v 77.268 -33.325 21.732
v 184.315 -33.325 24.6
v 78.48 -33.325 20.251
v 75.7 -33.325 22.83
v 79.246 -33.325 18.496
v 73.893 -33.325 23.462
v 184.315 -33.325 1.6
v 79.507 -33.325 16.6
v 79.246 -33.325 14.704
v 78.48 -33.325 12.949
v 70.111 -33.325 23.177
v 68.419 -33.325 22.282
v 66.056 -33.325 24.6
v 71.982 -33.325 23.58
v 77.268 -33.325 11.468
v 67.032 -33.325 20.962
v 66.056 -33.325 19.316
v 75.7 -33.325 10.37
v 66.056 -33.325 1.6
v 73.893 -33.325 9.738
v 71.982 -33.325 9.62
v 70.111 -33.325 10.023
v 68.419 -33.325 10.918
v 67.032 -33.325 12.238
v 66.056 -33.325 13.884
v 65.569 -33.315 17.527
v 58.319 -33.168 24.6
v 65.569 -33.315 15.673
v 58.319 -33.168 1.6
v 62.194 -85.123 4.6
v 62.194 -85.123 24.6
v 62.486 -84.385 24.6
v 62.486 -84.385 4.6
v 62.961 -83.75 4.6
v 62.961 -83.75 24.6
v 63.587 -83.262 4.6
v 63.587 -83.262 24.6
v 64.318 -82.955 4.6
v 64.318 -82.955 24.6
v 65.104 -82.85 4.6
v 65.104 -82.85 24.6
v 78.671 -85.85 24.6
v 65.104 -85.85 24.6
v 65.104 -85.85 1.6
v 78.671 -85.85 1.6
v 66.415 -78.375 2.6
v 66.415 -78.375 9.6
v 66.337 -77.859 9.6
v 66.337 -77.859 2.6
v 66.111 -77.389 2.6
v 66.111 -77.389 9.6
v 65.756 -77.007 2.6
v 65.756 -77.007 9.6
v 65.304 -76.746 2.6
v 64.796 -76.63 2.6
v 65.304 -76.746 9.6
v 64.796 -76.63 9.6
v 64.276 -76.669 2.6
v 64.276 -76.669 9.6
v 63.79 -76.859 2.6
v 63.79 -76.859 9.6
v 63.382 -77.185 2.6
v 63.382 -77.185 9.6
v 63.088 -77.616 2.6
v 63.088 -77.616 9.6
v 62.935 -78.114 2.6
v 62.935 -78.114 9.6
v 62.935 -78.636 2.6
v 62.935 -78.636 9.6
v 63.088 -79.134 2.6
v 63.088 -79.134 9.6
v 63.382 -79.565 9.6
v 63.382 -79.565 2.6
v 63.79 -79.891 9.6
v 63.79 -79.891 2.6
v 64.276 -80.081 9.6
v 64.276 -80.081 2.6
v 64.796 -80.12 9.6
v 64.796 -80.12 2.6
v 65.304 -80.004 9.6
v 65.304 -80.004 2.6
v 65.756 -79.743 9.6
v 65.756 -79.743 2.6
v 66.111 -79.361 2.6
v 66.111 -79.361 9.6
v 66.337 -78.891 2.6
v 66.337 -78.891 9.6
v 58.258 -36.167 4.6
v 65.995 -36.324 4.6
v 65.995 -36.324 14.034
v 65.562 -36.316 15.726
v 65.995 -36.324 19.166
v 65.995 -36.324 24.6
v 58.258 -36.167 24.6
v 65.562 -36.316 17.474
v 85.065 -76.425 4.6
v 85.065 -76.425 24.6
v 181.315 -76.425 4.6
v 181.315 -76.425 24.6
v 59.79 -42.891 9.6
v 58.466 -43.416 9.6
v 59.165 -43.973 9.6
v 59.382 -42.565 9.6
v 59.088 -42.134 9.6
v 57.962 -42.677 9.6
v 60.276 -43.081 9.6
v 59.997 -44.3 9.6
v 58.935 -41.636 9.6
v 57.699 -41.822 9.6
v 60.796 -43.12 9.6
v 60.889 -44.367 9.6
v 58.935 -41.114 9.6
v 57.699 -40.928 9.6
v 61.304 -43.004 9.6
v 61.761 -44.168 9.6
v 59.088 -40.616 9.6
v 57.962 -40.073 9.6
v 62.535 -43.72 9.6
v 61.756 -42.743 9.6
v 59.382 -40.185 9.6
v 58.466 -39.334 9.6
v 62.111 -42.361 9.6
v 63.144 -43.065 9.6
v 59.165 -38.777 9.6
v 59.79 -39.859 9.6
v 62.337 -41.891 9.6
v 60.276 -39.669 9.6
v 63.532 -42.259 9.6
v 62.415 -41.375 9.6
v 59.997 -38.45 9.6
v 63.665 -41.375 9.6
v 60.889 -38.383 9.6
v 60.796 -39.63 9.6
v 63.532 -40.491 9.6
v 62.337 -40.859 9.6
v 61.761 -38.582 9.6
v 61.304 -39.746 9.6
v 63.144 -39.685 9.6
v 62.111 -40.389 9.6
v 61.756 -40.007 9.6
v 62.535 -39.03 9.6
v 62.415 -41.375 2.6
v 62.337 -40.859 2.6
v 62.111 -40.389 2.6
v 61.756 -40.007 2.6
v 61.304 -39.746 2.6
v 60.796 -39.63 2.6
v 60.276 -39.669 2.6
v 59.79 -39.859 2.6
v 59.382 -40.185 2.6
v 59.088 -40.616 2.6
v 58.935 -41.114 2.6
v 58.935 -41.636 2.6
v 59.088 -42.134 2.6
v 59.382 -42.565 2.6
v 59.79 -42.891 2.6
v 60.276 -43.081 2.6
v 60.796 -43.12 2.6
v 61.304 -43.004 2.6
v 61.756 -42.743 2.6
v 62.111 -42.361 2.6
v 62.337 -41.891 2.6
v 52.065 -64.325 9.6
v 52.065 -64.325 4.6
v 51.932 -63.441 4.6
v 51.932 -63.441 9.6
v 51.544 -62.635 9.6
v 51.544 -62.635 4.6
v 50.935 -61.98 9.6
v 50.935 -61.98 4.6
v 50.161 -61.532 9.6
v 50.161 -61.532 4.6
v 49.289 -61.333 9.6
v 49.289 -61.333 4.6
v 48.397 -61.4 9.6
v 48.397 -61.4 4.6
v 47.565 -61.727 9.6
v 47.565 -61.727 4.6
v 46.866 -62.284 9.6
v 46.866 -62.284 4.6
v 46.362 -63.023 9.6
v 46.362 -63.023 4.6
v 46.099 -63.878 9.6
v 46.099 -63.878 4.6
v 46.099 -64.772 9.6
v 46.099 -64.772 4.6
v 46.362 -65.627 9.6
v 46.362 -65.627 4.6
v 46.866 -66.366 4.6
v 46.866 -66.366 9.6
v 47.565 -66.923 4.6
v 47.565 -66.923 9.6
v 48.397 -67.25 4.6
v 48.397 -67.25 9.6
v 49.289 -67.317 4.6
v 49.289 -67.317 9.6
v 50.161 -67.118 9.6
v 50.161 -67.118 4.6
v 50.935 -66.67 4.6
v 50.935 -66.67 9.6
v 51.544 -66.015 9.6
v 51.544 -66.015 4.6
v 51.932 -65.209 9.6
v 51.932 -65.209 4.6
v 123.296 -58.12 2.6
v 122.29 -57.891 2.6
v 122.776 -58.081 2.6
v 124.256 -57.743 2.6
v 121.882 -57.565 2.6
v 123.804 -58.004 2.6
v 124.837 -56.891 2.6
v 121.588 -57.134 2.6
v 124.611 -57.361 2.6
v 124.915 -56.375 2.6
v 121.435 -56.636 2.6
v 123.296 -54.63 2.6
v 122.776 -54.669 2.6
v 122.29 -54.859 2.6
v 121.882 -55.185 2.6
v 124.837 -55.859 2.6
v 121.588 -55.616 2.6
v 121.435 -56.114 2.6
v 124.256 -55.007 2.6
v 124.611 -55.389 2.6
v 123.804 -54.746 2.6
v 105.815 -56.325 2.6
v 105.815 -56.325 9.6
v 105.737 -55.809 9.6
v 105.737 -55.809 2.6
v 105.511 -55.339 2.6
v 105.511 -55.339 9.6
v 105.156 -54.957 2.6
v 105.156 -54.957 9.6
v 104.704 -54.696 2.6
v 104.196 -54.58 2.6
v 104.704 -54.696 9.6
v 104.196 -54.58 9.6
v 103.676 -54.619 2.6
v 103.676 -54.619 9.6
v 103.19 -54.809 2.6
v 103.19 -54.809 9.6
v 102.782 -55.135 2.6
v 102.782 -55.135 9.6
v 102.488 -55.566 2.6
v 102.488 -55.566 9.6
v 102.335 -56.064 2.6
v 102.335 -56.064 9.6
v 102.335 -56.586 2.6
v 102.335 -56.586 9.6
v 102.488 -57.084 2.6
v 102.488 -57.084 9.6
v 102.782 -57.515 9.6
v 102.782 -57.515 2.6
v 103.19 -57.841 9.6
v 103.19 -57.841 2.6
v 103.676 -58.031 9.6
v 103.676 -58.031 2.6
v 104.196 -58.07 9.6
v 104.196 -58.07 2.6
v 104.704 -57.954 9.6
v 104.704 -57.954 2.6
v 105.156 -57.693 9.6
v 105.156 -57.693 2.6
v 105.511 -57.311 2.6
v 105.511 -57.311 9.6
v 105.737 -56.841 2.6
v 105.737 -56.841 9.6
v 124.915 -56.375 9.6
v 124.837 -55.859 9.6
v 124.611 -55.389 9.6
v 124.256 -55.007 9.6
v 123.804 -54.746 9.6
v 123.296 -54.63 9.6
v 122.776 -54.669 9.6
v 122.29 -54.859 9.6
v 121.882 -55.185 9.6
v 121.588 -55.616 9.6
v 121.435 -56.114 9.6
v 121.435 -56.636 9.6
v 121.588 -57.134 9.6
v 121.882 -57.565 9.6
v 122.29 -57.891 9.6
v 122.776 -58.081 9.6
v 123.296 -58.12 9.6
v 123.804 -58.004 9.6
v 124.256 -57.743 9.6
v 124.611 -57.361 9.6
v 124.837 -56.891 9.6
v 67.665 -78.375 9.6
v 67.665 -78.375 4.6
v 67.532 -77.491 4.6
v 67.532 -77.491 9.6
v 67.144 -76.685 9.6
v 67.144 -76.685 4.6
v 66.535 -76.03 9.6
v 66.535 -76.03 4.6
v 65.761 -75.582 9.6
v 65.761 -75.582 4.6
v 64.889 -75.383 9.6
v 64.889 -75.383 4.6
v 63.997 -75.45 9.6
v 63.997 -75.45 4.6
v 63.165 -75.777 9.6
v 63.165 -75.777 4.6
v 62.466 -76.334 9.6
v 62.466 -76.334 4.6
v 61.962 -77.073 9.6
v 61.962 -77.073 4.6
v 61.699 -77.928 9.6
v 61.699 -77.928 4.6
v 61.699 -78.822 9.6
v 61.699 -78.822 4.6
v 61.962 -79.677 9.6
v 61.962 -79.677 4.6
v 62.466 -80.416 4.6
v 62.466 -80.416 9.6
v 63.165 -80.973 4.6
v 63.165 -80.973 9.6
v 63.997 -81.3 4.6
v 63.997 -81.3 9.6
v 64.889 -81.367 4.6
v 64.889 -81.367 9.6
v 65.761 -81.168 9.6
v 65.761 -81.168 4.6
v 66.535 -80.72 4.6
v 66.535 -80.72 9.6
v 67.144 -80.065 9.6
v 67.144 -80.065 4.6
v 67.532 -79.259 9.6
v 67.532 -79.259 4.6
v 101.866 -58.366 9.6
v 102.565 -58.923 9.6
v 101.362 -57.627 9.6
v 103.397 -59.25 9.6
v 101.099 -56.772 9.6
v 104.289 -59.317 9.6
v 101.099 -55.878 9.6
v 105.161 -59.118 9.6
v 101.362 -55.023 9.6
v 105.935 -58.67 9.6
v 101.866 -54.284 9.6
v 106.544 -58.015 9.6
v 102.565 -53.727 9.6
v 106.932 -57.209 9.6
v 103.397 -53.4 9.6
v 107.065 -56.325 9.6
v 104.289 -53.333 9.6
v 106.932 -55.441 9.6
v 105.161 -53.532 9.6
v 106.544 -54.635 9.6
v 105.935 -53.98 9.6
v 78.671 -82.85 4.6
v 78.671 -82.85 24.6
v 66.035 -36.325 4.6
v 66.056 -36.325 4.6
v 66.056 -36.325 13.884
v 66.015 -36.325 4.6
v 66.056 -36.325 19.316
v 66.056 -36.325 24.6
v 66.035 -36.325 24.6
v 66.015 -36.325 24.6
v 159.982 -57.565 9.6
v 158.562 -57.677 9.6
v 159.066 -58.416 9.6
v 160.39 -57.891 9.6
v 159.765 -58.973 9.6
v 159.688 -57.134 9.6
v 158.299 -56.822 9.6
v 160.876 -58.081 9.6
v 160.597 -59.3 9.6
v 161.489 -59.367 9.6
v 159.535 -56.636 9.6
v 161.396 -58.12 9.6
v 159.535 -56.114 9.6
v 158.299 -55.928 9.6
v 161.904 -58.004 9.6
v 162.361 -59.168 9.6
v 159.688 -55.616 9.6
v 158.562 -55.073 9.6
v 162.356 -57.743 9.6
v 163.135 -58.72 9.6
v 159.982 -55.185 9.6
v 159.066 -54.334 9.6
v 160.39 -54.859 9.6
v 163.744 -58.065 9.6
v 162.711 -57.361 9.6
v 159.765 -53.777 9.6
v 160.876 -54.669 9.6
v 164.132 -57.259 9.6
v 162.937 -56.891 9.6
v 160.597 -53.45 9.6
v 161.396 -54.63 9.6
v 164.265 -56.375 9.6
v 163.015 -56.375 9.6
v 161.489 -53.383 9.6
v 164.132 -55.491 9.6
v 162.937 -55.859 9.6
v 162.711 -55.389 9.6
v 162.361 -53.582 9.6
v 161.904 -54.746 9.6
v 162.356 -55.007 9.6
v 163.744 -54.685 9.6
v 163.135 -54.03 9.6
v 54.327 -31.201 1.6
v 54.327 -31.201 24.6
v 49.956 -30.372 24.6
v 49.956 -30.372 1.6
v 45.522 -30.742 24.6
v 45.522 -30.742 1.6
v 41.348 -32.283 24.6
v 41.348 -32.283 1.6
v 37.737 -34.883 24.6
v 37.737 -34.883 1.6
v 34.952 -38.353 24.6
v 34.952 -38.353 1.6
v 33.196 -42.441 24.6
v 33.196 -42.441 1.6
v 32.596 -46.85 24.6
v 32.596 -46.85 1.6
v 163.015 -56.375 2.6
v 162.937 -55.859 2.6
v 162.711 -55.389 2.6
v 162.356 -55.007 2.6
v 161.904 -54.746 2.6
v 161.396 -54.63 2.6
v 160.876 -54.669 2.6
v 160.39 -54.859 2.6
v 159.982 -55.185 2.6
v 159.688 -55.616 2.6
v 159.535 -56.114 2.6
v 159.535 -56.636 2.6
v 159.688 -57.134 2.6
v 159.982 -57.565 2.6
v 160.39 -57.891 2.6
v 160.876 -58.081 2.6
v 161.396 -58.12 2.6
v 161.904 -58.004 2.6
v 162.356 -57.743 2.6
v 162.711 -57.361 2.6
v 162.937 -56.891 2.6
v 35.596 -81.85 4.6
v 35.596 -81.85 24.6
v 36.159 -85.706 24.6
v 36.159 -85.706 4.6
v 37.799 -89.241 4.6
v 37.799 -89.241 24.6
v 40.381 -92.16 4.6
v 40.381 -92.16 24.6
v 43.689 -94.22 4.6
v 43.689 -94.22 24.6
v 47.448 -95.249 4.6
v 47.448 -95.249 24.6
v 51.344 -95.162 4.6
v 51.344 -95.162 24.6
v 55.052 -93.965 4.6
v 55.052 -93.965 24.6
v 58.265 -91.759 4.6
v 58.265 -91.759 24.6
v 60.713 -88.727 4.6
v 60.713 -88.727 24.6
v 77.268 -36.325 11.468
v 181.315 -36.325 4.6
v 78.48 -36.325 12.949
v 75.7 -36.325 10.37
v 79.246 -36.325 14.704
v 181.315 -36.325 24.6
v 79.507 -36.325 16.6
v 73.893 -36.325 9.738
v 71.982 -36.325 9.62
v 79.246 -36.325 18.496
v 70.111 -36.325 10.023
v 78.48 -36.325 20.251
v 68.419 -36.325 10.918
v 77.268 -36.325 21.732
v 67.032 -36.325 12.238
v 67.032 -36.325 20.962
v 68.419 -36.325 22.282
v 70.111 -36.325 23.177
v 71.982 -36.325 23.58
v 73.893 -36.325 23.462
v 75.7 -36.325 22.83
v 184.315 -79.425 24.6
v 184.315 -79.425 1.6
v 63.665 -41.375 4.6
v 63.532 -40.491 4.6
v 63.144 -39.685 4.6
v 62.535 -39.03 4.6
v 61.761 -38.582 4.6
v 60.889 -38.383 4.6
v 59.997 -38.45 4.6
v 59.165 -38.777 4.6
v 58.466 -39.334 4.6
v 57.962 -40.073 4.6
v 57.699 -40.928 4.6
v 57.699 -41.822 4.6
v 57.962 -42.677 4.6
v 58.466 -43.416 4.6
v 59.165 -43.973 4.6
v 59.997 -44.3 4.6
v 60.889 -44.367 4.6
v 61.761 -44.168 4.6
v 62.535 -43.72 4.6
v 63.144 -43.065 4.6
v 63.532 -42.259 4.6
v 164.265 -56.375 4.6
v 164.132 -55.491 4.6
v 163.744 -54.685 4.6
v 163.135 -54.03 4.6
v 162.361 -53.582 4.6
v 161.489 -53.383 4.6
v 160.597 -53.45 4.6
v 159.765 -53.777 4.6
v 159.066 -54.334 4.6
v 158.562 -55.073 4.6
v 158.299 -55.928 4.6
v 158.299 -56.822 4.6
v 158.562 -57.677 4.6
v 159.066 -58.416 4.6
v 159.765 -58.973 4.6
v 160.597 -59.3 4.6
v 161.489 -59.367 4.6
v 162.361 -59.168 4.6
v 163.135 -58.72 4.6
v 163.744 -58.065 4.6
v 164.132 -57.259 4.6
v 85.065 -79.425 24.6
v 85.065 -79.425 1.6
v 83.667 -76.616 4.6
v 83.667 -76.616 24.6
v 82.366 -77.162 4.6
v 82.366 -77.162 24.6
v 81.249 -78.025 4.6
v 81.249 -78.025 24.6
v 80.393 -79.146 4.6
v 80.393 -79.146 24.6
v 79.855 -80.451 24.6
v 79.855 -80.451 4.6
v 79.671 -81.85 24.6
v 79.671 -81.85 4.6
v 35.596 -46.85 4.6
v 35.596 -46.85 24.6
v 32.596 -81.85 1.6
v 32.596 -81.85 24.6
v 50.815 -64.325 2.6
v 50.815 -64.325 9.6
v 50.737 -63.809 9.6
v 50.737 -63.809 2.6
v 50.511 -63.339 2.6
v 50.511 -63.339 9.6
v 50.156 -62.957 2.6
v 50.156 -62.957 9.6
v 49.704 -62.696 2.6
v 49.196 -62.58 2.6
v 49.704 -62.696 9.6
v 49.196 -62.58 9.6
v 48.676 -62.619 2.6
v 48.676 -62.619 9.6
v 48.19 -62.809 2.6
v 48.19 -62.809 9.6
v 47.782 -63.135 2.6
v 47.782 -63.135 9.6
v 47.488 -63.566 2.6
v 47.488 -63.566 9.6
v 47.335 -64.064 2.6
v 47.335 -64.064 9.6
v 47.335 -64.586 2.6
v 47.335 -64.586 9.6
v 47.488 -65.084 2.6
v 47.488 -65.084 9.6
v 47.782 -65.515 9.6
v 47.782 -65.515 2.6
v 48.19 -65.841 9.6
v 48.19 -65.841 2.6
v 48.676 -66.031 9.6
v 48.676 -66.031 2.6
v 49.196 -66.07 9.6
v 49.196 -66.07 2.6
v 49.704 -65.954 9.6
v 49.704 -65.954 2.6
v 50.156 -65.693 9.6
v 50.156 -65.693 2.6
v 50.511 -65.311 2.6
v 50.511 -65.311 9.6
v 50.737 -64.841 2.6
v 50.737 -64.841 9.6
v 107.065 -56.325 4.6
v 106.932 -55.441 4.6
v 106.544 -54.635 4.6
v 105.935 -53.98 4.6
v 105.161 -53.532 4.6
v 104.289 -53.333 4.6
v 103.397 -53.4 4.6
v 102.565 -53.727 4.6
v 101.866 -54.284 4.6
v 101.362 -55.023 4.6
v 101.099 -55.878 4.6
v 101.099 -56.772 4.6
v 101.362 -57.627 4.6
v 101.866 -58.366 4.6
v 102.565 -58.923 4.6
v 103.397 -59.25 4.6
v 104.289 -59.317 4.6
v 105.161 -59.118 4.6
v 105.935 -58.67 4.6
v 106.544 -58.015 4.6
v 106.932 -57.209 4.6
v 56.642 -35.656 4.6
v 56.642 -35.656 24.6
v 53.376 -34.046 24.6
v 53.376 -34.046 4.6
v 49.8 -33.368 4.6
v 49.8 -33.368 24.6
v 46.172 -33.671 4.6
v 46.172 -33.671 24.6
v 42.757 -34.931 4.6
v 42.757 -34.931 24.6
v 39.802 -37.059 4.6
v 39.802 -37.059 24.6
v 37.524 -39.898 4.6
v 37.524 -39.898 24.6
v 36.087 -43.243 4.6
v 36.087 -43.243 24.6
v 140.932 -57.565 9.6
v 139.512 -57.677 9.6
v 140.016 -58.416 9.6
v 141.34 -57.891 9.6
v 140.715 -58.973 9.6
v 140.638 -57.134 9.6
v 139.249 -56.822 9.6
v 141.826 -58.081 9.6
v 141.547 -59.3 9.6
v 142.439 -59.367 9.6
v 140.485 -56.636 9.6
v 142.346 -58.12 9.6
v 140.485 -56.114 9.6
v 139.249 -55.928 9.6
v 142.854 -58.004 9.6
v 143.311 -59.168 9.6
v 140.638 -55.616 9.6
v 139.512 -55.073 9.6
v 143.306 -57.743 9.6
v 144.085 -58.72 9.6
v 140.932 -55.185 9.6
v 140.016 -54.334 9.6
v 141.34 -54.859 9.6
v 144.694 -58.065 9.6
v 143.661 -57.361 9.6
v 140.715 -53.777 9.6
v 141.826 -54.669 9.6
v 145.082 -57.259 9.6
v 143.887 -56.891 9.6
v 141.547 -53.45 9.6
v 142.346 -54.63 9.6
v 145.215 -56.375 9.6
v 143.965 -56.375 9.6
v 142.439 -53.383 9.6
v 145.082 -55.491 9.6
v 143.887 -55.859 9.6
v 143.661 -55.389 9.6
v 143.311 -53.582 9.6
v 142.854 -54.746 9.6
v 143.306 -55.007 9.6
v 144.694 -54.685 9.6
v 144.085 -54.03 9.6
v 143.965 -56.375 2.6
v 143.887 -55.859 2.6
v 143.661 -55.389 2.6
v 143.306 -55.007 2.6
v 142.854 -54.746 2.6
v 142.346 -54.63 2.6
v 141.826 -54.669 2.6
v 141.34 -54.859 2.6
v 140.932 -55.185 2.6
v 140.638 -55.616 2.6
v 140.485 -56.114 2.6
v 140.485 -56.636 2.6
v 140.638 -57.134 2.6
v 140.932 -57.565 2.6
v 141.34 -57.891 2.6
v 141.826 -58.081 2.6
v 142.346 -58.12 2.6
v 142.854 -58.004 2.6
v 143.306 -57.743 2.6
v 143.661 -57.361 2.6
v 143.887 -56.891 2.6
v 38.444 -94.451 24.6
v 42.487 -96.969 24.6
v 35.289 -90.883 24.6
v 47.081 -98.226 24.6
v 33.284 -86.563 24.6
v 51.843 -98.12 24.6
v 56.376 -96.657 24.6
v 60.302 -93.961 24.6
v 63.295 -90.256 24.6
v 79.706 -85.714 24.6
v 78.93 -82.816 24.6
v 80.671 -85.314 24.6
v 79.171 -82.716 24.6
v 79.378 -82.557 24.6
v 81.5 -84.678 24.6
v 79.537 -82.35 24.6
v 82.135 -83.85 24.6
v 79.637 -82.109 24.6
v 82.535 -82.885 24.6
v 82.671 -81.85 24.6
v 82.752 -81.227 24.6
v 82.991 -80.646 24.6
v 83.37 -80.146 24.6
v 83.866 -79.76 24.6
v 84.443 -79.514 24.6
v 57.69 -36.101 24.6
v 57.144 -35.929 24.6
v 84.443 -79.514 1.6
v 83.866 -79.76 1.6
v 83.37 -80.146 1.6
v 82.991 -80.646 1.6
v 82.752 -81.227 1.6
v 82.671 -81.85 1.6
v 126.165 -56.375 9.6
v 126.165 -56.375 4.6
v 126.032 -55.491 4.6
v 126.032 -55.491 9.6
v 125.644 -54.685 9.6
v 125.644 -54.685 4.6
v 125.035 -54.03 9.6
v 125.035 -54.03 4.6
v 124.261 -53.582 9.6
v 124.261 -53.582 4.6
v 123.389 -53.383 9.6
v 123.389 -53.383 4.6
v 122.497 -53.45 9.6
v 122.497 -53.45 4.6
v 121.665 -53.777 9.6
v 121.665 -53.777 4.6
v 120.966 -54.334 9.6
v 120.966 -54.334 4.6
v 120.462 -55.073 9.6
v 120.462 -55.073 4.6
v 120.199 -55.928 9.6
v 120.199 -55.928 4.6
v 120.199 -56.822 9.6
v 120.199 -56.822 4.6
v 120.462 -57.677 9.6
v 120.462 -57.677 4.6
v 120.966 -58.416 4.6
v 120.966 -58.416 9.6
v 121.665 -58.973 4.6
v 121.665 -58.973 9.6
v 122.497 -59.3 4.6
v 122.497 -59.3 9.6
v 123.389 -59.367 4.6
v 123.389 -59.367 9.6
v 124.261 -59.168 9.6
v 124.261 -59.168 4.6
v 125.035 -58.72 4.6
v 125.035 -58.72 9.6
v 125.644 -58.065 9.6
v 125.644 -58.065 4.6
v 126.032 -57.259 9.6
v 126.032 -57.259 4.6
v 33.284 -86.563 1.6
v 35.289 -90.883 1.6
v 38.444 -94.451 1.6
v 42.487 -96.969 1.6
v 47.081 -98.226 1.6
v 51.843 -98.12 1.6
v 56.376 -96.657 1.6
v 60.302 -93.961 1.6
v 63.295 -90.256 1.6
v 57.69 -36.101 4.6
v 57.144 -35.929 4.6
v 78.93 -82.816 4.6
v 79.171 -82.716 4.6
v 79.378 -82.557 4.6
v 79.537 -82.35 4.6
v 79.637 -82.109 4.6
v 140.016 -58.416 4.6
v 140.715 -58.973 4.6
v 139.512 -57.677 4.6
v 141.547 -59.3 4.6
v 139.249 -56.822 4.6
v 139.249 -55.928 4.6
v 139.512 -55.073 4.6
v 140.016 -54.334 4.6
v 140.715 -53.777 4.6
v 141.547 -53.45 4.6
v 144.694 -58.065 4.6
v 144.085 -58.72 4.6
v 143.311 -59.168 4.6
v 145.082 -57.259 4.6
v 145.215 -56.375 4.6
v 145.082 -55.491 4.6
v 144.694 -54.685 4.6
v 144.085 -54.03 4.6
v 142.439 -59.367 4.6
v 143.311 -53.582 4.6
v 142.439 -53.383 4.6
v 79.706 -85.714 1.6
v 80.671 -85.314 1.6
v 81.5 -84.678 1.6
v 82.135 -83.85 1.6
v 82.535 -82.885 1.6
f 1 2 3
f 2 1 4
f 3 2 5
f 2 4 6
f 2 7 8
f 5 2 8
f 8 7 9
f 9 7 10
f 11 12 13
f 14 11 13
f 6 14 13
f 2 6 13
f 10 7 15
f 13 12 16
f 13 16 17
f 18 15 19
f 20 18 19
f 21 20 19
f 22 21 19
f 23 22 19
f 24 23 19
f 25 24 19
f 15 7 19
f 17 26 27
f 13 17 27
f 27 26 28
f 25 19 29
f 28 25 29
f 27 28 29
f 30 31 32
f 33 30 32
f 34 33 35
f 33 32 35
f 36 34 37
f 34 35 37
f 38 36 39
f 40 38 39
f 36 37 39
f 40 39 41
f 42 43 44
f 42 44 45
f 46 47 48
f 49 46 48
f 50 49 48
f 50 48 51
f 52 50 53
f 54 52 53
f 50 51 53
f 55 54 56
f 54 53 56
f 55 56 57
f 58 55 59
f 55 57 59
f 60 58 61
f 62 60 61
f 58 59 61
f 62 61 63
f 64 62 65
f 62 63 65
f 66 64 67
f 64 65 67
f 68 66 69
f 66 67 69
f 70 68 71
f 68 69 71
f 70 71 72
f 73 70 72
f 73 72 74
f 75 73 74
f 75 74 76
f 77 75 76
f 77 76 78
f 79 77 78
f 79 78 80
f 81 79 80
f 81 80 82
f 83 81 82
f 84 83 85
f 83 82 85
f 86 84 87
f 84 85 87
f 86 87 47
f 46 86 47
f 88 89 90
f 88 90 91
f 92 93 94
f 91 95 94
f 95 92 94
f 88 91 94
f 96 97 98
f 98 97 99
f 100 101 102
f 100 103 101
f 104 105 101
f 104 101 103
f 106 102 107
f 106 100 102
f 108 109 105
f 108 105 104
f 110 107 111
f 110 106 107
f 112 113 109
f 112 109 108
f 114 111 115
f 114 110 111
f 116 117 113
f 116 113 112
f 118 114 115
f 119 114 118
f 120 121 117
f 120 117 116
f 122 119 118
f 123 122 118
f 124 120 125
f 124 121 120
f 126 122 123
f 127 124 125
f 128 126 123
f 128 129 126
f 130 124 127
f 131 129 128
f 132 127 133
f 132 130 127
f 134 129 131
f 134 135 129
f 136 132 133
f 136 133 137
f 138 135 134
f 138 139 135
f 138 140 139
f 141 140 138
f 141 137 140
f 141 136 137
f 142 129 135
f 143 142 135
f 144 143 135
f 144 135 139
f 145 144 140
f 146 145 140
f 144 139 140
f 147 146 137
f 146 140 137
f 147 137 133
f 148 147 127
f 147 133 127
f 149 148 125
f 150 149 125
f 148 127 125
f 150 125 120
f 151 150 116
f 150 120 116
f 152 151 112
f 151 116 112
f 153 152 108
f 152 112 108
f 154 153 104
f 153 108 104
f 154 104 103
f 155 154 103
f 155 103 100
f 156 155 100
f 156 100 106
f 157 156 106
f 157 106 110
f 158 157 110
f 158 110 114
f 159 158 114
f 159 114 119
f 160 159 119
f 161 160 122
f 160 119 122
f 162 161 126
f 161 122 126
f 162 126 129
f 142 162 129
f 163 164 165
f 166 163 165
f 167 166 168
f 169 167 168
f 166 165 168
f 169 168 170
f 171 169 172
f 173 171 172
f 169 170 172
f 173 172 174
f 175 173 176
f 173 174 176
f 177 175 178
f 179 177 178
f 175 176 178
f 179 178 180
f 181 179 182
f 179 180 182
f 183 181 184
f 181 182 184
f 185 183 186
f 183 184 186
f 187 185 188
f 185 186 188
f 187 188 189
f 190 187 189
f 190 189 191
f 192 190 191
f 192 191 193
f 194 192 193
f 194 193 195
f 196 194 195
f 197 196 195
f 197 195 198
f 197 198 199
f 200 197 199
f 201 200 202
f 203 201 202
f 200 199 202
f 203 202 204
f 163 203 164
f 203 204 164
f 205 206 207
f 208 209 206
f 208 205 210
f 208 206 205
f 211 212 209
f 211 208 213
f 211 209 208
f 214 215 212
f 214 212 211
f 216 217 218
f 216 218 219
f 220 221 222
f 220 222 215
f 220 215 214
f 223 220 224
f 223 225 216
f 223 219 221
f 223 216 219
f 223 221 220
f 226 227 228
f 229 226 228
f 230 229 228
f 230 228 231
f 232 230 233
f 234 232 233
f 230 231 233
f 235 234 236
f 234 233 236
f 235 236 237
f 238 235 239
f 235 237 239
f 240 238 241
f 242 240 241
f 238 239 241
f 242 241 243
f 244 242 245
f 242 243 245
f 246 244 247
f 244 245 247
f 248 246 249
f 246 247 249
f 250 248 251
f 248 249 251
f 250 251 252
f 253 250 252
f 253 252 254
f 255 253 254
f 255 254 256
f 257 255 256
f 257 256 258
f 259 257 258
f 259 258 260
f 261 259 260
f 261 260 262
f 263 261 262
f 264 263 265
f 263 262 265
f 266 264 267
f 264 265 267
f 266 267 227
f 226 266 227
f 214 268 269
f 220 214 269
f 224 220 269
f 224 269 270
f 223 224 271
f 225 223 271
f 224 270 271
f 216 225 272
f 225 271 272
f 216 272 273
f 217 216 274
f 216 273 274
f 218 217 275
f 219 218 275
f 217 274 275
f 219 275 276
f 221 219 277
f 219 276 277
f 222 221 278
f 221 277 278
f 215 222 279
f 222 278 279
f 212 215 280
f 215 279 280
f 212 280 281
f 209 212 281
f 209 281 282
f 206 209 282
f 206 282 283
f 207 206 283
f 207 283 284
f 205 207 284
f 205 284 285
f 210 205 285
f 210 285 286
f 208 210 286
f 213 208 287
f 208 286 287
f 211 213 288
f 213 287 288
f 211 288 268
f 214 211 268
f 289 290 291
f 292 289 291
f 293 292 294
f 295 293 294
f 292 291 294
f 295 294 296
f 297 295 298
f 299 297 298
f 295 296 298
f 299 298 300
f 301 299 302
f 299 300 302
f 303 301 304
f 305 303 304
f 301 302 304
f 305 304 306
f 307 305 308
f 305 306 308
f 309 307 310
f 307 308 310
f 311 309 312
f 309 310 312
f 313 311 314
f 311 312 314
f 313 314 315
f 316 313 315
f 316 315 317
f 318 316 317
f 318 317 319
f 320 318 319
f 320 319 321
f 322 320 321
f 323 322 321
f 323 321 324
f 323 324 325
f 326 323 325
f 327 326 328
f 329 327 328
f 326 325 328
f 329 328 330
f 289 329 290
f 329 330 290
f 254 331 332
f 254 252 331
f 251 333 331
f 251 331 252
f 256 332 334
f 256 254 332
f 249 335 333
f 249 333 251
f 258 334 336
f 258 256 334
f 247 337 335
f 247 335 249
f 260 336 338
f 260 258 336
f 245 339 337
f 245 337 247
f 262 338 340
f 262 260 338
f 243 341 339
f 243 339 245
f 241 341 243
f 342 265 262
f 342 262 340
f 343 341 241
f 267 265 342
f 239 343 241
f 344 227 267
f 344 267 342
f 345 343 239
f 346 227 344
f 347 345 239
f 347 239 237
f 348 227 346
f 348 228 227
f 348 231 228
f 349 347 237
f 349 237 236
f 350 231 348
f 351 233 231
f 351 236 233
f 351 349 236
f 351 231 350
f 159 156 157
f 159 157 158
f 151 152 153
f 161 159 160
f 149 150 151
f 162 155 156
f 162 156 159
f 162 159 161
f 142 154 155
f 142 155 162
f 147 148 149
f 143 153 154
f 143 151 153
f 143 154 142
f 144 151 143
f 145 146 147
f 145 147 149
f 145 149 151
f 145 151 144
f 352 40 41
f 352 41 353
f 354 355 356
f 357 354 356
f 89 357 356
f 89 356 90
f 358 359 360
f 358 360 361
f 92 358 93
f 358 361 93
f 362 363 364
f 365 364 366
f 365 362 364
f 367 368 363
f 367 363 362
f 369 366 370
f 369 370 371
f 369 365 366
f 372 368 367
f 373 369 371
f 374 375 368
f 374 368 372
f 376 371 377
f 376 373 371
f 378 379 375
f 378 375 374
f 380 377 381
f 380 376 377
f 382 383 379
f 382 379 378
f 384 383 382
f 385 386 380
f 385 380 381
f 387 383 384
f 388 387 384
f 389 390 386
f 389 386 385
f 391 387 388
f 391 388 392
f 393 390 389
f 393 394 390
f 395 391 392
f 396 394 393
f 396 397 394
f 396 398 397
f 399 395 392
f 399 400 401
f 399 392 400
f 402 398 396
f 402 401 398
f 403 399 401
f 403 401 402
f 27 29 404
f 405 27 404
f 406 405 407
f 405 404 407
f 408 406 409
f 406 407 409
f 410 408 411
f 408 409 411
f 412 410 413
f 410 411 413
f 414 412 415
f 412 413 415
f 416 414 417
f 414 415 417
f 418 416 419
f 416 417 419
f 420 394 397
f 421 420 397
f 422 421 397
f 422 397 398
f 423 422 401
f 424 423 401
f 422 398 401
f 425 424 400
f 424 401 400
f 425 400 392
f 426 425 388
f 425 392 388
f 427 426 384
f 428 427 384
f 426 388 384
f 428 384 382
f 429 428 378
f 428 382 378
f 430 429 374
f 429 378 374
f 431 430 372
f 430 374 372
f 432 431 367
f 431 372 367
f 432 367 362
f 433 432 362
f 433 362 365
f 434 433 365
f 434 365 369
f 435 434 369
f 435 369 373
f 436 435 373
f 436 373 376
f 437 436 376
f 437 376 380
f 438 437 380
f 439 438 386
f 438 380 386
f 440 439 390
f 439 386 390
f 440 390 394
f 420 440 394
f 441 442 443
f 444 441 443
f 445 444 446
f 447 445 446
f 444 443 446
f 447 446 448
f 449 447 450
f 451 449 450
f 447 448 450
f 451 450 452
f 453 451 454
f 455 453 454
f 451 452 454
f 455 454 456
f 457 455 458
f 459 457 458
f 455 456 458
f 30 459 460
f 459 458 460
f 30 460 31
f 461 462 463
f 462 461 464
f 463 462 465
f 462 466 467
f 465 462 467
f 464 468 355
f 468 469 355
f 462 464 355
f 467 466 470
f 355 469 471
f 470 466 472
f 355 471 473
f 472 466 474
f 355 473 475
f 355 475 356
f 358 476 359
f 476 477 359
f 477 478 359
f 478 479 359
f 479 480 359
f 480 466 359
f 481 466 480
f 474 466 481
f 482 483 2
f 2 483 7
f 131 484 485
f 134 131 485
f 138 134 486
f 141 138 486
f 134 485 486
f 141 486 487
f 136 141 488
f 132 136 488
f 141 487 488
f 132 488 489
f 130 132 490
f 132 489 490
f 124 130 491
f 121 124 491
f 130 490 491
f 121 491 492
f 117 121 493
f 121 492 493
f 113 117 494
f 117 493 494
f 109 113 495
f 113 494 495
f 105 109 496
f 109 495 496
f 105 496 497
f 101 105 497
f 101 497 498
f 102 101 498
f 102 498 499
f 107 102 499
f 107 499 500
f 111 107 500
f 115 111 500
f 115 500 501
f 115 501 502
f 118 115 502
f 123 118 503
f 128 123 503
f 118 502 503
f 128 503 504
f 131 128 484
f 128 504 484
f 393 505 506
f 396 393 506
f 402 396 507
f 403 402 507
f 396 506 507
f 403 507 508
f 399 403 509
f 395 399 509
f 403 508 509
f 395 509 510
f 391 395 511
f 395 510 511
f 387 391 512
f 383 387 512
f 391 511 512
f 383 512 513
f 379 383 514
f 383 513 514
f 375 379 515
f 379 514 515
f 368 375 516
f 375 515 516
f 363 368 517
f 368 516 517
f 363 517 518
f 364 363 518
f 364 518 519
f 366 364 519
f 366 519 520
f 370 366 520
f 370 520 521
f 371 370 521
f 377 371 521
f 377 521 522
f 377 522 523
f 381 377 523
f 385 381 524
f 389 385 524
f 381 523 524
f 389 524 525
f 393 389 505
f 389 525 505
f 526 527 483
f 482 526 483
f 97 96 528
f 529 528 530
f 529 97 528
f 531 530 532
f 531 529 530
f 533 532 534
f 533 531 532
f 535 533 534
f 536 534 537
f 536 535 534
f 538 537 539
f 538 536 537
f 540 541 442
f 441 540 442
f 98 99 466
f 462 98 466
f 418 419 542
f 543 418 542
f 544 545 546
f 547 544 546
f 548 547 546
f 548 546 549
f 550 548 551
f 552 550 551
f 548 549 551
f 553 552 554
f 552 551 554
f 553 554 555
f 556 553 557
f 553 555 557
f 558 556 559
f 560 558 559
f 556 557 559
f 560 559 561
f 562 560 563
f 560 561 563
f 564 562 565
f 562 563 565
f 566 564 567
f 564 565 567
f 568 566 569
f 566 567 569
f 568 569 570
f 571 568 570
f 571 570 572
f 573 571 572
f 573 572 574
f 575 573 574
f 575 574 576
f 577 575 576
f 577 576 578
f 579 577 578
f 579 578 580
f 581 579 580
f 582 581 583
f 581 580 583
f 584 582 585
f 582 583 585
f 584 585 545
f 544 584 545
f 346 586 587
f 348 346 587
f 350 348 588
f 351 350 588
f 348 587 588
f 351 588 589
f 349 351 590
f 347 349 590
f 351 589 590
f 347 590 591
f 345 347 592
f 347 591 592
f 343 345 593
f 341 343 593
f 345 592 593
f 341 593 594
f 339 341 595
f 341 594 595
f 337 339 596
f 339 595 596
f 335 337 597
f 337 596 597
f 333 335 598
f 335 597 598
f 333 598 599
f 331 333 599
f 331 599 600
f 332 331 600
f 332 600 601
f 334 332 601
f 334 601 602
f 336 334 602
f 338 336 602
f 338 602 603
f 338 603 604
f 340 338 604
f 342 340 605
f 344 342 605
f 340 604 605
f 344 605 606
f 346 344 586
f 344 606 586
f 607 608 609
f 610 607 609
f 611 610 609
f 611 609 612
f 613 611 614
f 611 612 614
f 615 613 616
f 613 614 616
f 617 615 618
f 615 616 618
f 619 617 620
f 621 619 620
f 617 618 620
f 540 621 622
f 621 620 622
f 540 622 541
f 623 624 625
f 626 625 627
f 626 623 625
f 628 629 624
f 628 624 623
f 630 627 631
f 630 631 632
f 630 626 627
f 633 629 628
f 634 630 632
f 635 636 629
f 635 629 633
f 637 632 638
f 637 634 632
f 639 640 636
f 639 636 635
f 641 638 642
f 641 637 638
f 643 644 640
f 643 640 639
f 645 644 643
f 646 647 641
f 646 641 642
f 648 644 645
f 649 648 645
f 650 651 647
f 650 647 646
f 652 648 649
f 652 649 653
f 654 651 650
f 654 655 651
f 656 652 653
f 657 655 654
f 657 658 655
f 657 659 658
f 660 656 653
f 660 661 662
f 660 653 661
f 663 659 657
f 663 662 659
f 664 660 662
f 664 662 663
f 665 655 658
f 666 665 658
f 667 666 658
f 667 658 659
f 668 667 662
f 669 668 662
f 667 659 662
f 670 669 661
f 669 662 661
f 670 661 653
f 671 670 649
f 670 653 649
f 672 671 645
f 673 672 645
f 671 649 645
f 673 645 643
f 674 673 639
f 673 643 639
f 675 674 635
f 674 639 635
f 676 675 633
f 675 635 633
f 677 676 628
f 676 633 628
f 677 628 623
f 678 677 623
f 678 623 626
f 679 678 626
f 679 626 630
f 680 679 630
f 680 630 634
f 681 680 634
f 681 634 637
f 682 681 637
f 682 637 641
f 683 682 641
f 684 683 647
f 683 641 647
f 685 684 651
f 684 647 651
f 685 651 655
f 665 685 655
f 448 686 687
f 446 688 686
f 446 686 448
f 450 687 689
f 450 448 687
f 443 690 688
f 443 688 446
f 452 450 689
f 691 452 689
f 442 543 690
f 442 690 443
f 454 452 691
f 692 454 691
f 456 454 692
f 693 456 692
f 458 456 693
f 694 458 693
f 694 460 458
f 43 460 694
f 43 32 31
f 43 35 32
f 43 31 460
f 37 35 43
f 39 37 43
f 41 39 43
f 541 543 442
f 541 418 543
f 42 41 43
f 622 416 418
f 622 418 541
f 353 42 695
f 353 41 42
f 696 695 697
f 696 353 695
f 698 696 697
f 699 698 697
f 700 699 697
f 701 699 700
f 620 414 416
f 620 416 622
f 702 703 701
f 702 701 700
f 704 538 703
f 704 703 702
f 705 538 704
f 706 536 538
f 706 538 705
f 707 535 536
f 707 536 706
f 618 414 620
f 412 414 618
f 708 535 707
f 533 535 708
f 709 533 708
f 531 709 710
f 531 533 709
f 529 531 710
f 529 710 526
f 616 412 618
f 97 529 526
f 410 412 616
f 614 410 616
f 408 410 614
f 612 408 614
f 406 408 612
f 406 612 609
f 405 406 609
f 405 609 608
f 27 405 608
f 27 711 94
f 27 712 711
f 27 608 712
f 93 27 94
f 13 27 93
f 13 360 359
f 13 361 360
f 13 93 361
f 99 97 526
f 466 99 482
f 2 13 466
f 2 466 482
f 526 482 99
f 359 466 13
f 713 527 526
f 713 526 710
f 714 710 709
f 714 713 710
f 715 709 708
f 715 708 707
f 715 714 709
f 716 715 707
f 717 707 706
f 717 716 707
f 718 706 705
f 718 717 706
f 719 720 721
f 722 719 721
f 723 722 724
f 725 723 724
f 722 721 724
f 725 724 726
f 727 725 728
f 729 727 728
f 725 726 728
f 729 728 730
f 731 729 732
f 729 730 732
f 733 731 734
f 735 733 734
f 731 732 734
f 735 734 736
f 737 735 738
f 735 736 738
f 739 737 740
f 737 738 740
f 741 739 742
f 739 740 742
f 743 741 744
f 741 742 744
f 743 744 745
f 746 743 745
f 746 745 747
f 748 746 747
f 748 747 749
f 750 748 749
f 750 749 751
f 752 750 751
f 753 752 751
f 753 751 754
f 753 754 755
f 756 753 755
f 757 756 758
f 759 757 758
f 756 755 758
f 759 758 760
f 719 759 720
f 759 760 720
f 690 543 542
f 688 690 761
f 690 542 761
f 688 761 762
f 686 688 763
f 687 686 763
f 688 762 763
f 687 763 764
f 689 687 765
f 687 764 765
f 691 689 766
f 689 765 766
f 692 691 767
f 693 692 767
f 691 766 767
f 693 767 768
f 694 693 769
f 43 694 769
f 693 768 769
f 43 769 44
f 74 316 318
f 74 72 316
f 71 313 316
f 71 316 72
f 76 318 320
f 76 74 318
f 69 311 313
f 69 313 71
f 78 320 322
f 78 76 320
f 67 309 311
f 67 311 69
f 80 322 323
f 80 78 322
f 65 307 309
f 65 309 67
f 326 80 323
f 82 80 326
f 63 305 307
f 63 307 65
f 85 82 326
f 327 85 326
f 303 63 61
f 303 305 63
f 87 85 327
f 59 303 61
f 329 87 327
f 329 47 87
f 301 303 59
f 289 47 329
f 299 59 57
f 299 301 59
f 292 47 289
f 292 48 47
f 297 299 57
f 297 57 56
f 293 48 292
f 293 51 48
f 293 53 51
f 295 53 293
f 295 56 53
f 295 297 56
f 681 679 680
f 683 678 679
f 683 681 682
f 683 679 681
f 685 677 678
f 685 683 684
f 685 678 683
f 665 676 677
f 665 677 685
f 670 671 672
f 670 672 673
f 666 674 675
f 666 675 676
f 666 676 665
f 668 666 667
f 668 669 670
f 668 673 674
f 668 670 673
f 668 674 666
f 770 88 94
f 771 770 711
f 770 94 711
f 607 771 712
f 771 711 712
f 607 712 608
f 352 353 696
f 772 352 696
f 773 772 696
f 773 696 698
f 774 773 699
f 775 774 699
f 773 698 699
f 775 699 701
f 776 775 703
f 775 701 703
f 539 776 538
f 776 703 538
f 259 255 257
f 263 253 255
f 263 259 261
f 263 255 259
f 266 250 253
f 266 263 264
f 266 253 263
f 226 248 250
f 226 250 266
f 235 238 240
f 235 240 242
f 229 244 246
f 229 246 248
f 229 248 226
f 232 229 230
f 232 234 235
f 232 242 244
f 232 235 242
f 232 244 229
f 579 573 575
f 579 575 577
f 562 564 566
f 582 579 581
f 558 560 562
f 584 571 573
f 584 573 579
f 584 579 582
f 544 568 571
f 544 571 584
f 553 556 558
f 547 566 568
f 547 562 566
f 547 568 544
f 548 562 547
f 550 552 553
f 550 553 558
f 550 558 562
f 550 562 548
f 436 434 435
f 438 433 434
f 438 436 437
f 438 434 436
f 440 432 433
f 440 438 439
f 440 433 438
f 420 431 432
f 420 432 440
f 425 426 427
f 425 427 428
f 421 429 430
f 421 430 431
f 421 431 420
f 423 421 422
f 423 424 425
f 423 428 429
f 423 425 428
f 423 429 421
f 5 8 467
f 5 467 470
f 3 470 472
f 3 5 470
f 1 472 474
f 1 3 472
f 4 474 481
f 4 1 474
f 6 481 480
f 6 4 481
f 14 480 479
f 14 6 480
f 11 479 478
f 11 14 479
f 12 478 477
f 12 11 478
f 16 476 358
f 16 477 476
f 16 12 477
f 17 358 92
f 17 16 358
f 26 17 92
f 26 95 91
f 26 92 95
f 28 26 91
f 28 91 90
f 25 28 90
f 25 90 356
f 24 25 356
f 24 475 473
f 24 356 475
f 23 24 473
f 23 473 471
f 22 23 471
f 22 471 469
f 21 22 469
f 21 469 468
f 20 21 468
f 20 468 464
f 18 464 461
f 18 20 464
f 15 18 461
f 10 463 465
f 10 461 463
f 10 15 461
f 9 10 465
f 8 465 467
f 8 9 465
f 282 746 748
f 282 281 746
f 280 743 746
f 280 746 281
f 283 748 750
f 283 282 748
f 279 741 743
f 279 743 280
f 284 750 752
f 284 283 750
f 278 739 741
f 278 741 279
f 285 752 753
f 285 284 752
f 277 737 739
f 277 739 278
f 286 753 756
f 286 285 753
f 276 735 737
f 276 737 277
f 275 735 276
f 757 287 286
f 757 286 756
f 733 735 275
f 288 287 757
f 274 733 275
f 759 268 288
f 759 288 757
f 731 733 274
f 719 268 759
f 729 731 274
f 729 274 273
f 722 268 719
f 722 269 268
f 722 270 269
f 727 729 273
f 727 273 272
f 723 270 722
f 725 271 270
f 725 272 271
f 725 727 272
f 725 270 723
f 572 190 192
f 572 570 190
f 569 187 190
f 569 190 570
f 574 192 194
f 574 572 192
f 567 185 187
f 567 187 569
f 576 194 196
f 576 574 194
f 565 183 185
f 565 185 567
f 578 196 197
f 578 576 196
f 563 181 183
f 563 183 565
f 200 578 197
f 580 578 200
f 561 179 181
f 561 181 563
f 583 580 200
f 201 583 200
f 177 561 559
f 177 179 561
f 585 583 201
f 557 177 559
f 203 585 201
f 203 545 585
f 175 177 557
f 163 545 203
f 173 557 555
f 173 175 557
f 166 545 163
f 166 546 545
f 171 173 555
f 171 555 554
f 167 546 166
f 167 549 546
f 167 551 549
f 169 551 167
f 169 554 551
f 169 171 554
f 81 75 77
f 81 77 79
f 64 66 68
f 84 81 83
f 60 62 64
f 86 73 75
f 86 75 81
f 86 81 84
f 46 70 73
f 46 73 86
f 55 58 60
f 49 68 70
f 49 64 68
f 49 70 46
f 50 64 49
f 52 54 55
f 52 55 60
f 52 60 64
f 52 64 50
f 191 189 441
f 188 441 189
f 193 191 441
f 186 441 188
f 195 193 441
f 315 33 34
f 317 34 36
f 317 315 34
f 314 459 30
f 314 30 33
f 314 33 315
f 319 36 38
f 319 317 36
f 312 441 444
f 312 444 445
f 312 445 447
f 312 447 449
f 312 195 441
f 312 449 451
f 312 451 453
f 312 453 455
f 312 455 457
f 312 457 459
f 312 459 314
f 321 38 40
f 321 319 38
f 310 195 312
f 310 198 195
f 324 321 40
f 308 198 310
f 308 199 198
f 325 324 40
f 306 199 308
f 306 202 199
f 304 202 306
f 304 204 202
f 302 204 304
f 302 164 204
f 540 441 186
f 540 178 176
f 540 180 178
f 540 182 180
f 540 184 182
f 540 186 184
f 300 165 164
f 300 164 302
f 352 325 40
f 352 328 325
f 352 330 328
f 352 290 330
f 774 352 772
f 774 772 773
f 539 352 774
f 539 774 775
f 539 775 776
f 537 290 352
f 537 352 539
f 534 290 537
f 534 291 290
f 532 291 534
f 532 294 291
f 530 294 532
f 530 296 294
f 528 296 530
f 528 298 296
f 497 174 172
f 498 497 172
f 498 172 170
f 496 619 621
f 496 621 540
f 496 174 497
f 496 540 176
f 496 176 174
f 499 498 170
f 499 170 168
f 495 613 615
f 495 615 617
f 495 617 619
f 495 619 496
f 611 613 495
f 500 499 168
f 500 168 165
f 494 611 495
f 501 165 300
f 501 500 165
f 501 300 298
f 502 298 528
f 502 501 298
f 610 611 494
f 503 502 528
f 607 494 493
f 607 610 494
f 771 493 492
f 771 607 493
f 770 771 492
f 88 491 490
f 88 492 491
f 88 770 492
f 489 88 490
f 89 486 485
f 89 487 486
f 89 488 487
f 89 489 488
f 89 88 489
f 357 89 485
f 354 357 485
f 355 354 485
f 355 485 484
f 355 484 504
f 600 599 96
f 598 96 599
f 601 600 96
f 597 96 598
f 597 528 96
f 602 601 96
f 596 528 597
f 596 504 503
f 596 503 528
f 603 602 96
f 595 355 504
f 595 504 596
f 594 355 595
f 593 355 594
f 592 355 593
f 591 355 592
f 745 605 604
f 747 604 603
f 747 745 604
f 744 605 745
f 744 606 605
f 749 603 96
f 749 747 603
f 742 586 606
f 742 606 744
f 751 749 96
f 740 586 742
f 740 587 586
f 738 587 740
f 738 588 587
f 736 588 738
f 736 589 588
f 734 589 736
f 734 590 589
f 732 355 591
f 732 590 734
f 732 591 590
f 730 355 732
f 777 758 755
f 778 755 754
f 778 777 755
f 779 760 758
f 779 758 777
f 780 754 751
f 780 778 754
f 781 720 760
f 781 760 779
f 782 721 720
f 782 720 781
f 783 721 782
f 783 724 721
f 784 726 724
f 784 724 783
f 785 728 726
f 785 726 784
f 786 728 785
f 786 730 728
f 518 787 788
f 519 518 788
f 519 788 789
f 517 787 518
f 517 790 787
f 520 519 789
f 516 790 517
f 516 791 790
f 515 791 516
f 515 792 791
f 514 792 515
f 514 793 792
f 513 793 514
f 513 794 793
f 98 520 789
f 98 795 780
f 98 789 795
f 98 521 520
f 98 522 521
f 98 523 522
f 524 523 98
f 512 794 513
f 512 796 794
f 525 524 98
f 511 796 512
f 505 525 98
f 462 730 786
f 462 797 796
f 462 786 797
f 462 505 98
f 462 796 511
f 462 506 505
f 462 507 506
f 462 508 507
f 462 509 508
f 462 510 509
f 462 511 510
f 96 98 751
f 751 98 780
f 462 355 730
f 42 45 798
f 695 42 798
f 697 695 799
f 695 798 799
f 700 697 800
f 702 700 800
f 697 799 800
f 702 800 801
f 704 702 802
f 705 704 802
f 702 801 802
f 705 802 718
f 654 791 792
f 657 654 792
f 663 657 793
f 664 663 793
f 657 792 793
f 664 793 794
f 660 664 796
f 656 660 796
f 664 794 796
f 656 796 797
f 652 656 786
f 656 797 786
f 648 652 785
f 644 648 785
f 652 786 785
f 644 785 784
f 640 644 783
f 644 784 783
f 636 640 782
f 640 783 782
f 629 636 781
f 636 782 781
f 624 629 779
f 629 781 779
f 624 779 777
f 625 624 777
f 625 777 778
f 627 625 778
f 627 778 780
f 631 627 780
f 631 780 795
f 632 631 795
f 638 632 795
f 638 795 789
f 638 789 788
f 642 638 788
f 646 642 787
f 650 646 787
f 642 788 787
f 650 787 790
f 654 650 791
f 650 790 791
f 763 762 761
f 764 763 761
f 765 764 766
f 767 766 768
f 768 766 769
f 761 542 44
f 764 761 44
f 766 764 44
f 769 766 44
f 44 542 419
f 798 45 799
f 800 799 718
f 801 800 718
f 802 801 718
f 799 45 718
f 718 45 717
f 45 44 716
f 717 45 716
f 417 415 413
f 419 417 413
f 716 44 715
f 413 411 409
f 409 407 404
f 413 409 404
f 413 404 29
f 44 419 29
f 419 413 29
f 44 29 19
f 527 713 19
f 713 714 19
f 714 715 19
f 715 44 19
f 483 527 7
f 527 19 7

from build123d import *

# Parameters (mm, degrees)
PAD_DEPTH       = 23
POCKET_DEPTH    = 20
SKETCH002_R     = 3
PAD001_DEPTH    = 5
SKETCH003_R     = 1.75
POCKET001_DEPTH = 7
SKETCH004_R     = 7
POCKET002_DEPTH = 37


with BuildPart() as part:
    # Sketch (on Face1 of ShapeBinder) → Pad (new body)
    with BuildSketch(Plane.XY.offset(1.6)):
        with BuildLine():
            Line((65.104061, -85.85), (78.671175, -85.849875))
            ThreePointArc((78.671175, -85.849875), (81.499513, -84.678339), (82.67105, -81.850001))
            ThreePointArc((85.065002, -79.425001), (83.370362, -80.146209), (82.67105, -81.850001))
            Line((85.065002, -79.425001), (184.315, -79.425))
            Line((184.315, -79.425), (184.315, -33.325))
            Line((184.315, -33.325), (85.065, -33.325))
            Line((85.065, -33.325), (66.055583, -33.325))
            Line((66.055583, -33.325), (58.318648, -33.167991))
            ThreePointArc((58.318648, -33.167991), (41.347688, -32.282578), (32.59625, -46.85))
            Line((32.59625, -46.85), (32.59625, -81.85))
            ThreePointArc((32.59625, -81.85), (47.081166, -98.22649), (65.104061, -85.85))
        make_face()
    extrude(amount=PAD_DEPTH)

    # Sketch001 (on Face11 of Pad) → Pocket (cut)
    with BuildSketch(Plane.XY.offset(24.6)):
        with BuildLine():
            Line((85.065004, -76.42489), (181.315, -76.425))
            Line((181.315, -76.425), (181.315, -36.325))
            Line((181.315, -36.325), (66.055583, -36.325))
            ThreePointArc((66.055583, -36.325), (66.025147, -36.324846), (65.994715, -36.324382))
            Line((65.994715, -36.324382), (58.25778, -36.167373))
            ThreePointArc((58.25778, -36.167373), (57.41292, -36.028001), (56.641848, -35.655629))
            ThreePointArc((56.641848, -35.655629), (42.756517, -34.9312), (35.59625, -46.85))
            Line((35.59625, -46.85), (35.59625, -81.85))
            ThreePointArc((35.59625, -81.85), (47.447597, -95.248953), (62.193575, -85.122625))
            ThreePointArc((62.193575, -85.122625), (63.25771, -83.485372), (65.104092, -82.849876))
            Line((65.104092, -82.849876), (78.671175, -82.849878))
            ThreePointArc((78.671175, -82.849878), (79.378193, -82.557021), (79.67105, -81.850003))
            ThreePointArc((85.065004, -76.42489), (81.249022, -78.024869), (79.67105, -81.850003))
        make_face()
    extrude(amount=-POCKET_DEPTH, mode=Mode.SUBTRACT)

    # Sketch002 (on Face26 of Pocket) → Pad001 (join)
    with BuildSketch(Plane.XY.offset(4.6)):
        with Locations((64.665, -78.375)):
            Circle(SKETCH002_R)
        with Locations((49.065, -64.325)):
            Circle(SKETCH002_R)
        with Locations((60.665, -41.375)):
            Circle(SKETCH002_R)
        with Locations((104.065, -56.325)):
            Circle(SKETCH002_R)
        with Locations((123.165, -56.375)):
            Circle(SKETCH002_R)
        with Locations((142.215, -56.375)):
            Circle(SKETCH002_R)
        with Locations((161.265, -56.375)):
            Circle(SKETCH002_R)
    extrude(amount=PAD001_DEPTH)

    # Sketch003 (on Face37 of Pad001) → Pocket001 (cut)
    with BuildSketch(Plane.XY.offset(9.6)):
        with Locations((49.065, -64.325)):
            Circle(SKETCH003_R)
        with Locations((64.665, -78.375)):
            Circle(SKETCH003_R)
        with Locations((60.665, -41.375)):
            Circle(SKETCH003_R)
        with Locations((142.215, -56.375)):
            Circle(SKETCH003_R)
        with Locations((161.265, -56.375)):
            Circle(SKETCH003_R)
        with Locations((104.065, -56.325)):
            Circle(SKETCH003_R)
        with Locations((123.165, -56.375)):
            Circle(SKETCH003_R)
    extrude(amount=-POCKET001_DEPTH, mode=Mode.SUBTRACT)

    # Sketch004 → Pocket002 (cut)
    with BuildSketch(Plane.XZ):
        with Locations((72.507256, 16.6)):
            Circle(SKETCH004_R)
    extrude(amount=POCKET002_DEPTH, mode=Mode.SUBTRACT)


solid = part.part
